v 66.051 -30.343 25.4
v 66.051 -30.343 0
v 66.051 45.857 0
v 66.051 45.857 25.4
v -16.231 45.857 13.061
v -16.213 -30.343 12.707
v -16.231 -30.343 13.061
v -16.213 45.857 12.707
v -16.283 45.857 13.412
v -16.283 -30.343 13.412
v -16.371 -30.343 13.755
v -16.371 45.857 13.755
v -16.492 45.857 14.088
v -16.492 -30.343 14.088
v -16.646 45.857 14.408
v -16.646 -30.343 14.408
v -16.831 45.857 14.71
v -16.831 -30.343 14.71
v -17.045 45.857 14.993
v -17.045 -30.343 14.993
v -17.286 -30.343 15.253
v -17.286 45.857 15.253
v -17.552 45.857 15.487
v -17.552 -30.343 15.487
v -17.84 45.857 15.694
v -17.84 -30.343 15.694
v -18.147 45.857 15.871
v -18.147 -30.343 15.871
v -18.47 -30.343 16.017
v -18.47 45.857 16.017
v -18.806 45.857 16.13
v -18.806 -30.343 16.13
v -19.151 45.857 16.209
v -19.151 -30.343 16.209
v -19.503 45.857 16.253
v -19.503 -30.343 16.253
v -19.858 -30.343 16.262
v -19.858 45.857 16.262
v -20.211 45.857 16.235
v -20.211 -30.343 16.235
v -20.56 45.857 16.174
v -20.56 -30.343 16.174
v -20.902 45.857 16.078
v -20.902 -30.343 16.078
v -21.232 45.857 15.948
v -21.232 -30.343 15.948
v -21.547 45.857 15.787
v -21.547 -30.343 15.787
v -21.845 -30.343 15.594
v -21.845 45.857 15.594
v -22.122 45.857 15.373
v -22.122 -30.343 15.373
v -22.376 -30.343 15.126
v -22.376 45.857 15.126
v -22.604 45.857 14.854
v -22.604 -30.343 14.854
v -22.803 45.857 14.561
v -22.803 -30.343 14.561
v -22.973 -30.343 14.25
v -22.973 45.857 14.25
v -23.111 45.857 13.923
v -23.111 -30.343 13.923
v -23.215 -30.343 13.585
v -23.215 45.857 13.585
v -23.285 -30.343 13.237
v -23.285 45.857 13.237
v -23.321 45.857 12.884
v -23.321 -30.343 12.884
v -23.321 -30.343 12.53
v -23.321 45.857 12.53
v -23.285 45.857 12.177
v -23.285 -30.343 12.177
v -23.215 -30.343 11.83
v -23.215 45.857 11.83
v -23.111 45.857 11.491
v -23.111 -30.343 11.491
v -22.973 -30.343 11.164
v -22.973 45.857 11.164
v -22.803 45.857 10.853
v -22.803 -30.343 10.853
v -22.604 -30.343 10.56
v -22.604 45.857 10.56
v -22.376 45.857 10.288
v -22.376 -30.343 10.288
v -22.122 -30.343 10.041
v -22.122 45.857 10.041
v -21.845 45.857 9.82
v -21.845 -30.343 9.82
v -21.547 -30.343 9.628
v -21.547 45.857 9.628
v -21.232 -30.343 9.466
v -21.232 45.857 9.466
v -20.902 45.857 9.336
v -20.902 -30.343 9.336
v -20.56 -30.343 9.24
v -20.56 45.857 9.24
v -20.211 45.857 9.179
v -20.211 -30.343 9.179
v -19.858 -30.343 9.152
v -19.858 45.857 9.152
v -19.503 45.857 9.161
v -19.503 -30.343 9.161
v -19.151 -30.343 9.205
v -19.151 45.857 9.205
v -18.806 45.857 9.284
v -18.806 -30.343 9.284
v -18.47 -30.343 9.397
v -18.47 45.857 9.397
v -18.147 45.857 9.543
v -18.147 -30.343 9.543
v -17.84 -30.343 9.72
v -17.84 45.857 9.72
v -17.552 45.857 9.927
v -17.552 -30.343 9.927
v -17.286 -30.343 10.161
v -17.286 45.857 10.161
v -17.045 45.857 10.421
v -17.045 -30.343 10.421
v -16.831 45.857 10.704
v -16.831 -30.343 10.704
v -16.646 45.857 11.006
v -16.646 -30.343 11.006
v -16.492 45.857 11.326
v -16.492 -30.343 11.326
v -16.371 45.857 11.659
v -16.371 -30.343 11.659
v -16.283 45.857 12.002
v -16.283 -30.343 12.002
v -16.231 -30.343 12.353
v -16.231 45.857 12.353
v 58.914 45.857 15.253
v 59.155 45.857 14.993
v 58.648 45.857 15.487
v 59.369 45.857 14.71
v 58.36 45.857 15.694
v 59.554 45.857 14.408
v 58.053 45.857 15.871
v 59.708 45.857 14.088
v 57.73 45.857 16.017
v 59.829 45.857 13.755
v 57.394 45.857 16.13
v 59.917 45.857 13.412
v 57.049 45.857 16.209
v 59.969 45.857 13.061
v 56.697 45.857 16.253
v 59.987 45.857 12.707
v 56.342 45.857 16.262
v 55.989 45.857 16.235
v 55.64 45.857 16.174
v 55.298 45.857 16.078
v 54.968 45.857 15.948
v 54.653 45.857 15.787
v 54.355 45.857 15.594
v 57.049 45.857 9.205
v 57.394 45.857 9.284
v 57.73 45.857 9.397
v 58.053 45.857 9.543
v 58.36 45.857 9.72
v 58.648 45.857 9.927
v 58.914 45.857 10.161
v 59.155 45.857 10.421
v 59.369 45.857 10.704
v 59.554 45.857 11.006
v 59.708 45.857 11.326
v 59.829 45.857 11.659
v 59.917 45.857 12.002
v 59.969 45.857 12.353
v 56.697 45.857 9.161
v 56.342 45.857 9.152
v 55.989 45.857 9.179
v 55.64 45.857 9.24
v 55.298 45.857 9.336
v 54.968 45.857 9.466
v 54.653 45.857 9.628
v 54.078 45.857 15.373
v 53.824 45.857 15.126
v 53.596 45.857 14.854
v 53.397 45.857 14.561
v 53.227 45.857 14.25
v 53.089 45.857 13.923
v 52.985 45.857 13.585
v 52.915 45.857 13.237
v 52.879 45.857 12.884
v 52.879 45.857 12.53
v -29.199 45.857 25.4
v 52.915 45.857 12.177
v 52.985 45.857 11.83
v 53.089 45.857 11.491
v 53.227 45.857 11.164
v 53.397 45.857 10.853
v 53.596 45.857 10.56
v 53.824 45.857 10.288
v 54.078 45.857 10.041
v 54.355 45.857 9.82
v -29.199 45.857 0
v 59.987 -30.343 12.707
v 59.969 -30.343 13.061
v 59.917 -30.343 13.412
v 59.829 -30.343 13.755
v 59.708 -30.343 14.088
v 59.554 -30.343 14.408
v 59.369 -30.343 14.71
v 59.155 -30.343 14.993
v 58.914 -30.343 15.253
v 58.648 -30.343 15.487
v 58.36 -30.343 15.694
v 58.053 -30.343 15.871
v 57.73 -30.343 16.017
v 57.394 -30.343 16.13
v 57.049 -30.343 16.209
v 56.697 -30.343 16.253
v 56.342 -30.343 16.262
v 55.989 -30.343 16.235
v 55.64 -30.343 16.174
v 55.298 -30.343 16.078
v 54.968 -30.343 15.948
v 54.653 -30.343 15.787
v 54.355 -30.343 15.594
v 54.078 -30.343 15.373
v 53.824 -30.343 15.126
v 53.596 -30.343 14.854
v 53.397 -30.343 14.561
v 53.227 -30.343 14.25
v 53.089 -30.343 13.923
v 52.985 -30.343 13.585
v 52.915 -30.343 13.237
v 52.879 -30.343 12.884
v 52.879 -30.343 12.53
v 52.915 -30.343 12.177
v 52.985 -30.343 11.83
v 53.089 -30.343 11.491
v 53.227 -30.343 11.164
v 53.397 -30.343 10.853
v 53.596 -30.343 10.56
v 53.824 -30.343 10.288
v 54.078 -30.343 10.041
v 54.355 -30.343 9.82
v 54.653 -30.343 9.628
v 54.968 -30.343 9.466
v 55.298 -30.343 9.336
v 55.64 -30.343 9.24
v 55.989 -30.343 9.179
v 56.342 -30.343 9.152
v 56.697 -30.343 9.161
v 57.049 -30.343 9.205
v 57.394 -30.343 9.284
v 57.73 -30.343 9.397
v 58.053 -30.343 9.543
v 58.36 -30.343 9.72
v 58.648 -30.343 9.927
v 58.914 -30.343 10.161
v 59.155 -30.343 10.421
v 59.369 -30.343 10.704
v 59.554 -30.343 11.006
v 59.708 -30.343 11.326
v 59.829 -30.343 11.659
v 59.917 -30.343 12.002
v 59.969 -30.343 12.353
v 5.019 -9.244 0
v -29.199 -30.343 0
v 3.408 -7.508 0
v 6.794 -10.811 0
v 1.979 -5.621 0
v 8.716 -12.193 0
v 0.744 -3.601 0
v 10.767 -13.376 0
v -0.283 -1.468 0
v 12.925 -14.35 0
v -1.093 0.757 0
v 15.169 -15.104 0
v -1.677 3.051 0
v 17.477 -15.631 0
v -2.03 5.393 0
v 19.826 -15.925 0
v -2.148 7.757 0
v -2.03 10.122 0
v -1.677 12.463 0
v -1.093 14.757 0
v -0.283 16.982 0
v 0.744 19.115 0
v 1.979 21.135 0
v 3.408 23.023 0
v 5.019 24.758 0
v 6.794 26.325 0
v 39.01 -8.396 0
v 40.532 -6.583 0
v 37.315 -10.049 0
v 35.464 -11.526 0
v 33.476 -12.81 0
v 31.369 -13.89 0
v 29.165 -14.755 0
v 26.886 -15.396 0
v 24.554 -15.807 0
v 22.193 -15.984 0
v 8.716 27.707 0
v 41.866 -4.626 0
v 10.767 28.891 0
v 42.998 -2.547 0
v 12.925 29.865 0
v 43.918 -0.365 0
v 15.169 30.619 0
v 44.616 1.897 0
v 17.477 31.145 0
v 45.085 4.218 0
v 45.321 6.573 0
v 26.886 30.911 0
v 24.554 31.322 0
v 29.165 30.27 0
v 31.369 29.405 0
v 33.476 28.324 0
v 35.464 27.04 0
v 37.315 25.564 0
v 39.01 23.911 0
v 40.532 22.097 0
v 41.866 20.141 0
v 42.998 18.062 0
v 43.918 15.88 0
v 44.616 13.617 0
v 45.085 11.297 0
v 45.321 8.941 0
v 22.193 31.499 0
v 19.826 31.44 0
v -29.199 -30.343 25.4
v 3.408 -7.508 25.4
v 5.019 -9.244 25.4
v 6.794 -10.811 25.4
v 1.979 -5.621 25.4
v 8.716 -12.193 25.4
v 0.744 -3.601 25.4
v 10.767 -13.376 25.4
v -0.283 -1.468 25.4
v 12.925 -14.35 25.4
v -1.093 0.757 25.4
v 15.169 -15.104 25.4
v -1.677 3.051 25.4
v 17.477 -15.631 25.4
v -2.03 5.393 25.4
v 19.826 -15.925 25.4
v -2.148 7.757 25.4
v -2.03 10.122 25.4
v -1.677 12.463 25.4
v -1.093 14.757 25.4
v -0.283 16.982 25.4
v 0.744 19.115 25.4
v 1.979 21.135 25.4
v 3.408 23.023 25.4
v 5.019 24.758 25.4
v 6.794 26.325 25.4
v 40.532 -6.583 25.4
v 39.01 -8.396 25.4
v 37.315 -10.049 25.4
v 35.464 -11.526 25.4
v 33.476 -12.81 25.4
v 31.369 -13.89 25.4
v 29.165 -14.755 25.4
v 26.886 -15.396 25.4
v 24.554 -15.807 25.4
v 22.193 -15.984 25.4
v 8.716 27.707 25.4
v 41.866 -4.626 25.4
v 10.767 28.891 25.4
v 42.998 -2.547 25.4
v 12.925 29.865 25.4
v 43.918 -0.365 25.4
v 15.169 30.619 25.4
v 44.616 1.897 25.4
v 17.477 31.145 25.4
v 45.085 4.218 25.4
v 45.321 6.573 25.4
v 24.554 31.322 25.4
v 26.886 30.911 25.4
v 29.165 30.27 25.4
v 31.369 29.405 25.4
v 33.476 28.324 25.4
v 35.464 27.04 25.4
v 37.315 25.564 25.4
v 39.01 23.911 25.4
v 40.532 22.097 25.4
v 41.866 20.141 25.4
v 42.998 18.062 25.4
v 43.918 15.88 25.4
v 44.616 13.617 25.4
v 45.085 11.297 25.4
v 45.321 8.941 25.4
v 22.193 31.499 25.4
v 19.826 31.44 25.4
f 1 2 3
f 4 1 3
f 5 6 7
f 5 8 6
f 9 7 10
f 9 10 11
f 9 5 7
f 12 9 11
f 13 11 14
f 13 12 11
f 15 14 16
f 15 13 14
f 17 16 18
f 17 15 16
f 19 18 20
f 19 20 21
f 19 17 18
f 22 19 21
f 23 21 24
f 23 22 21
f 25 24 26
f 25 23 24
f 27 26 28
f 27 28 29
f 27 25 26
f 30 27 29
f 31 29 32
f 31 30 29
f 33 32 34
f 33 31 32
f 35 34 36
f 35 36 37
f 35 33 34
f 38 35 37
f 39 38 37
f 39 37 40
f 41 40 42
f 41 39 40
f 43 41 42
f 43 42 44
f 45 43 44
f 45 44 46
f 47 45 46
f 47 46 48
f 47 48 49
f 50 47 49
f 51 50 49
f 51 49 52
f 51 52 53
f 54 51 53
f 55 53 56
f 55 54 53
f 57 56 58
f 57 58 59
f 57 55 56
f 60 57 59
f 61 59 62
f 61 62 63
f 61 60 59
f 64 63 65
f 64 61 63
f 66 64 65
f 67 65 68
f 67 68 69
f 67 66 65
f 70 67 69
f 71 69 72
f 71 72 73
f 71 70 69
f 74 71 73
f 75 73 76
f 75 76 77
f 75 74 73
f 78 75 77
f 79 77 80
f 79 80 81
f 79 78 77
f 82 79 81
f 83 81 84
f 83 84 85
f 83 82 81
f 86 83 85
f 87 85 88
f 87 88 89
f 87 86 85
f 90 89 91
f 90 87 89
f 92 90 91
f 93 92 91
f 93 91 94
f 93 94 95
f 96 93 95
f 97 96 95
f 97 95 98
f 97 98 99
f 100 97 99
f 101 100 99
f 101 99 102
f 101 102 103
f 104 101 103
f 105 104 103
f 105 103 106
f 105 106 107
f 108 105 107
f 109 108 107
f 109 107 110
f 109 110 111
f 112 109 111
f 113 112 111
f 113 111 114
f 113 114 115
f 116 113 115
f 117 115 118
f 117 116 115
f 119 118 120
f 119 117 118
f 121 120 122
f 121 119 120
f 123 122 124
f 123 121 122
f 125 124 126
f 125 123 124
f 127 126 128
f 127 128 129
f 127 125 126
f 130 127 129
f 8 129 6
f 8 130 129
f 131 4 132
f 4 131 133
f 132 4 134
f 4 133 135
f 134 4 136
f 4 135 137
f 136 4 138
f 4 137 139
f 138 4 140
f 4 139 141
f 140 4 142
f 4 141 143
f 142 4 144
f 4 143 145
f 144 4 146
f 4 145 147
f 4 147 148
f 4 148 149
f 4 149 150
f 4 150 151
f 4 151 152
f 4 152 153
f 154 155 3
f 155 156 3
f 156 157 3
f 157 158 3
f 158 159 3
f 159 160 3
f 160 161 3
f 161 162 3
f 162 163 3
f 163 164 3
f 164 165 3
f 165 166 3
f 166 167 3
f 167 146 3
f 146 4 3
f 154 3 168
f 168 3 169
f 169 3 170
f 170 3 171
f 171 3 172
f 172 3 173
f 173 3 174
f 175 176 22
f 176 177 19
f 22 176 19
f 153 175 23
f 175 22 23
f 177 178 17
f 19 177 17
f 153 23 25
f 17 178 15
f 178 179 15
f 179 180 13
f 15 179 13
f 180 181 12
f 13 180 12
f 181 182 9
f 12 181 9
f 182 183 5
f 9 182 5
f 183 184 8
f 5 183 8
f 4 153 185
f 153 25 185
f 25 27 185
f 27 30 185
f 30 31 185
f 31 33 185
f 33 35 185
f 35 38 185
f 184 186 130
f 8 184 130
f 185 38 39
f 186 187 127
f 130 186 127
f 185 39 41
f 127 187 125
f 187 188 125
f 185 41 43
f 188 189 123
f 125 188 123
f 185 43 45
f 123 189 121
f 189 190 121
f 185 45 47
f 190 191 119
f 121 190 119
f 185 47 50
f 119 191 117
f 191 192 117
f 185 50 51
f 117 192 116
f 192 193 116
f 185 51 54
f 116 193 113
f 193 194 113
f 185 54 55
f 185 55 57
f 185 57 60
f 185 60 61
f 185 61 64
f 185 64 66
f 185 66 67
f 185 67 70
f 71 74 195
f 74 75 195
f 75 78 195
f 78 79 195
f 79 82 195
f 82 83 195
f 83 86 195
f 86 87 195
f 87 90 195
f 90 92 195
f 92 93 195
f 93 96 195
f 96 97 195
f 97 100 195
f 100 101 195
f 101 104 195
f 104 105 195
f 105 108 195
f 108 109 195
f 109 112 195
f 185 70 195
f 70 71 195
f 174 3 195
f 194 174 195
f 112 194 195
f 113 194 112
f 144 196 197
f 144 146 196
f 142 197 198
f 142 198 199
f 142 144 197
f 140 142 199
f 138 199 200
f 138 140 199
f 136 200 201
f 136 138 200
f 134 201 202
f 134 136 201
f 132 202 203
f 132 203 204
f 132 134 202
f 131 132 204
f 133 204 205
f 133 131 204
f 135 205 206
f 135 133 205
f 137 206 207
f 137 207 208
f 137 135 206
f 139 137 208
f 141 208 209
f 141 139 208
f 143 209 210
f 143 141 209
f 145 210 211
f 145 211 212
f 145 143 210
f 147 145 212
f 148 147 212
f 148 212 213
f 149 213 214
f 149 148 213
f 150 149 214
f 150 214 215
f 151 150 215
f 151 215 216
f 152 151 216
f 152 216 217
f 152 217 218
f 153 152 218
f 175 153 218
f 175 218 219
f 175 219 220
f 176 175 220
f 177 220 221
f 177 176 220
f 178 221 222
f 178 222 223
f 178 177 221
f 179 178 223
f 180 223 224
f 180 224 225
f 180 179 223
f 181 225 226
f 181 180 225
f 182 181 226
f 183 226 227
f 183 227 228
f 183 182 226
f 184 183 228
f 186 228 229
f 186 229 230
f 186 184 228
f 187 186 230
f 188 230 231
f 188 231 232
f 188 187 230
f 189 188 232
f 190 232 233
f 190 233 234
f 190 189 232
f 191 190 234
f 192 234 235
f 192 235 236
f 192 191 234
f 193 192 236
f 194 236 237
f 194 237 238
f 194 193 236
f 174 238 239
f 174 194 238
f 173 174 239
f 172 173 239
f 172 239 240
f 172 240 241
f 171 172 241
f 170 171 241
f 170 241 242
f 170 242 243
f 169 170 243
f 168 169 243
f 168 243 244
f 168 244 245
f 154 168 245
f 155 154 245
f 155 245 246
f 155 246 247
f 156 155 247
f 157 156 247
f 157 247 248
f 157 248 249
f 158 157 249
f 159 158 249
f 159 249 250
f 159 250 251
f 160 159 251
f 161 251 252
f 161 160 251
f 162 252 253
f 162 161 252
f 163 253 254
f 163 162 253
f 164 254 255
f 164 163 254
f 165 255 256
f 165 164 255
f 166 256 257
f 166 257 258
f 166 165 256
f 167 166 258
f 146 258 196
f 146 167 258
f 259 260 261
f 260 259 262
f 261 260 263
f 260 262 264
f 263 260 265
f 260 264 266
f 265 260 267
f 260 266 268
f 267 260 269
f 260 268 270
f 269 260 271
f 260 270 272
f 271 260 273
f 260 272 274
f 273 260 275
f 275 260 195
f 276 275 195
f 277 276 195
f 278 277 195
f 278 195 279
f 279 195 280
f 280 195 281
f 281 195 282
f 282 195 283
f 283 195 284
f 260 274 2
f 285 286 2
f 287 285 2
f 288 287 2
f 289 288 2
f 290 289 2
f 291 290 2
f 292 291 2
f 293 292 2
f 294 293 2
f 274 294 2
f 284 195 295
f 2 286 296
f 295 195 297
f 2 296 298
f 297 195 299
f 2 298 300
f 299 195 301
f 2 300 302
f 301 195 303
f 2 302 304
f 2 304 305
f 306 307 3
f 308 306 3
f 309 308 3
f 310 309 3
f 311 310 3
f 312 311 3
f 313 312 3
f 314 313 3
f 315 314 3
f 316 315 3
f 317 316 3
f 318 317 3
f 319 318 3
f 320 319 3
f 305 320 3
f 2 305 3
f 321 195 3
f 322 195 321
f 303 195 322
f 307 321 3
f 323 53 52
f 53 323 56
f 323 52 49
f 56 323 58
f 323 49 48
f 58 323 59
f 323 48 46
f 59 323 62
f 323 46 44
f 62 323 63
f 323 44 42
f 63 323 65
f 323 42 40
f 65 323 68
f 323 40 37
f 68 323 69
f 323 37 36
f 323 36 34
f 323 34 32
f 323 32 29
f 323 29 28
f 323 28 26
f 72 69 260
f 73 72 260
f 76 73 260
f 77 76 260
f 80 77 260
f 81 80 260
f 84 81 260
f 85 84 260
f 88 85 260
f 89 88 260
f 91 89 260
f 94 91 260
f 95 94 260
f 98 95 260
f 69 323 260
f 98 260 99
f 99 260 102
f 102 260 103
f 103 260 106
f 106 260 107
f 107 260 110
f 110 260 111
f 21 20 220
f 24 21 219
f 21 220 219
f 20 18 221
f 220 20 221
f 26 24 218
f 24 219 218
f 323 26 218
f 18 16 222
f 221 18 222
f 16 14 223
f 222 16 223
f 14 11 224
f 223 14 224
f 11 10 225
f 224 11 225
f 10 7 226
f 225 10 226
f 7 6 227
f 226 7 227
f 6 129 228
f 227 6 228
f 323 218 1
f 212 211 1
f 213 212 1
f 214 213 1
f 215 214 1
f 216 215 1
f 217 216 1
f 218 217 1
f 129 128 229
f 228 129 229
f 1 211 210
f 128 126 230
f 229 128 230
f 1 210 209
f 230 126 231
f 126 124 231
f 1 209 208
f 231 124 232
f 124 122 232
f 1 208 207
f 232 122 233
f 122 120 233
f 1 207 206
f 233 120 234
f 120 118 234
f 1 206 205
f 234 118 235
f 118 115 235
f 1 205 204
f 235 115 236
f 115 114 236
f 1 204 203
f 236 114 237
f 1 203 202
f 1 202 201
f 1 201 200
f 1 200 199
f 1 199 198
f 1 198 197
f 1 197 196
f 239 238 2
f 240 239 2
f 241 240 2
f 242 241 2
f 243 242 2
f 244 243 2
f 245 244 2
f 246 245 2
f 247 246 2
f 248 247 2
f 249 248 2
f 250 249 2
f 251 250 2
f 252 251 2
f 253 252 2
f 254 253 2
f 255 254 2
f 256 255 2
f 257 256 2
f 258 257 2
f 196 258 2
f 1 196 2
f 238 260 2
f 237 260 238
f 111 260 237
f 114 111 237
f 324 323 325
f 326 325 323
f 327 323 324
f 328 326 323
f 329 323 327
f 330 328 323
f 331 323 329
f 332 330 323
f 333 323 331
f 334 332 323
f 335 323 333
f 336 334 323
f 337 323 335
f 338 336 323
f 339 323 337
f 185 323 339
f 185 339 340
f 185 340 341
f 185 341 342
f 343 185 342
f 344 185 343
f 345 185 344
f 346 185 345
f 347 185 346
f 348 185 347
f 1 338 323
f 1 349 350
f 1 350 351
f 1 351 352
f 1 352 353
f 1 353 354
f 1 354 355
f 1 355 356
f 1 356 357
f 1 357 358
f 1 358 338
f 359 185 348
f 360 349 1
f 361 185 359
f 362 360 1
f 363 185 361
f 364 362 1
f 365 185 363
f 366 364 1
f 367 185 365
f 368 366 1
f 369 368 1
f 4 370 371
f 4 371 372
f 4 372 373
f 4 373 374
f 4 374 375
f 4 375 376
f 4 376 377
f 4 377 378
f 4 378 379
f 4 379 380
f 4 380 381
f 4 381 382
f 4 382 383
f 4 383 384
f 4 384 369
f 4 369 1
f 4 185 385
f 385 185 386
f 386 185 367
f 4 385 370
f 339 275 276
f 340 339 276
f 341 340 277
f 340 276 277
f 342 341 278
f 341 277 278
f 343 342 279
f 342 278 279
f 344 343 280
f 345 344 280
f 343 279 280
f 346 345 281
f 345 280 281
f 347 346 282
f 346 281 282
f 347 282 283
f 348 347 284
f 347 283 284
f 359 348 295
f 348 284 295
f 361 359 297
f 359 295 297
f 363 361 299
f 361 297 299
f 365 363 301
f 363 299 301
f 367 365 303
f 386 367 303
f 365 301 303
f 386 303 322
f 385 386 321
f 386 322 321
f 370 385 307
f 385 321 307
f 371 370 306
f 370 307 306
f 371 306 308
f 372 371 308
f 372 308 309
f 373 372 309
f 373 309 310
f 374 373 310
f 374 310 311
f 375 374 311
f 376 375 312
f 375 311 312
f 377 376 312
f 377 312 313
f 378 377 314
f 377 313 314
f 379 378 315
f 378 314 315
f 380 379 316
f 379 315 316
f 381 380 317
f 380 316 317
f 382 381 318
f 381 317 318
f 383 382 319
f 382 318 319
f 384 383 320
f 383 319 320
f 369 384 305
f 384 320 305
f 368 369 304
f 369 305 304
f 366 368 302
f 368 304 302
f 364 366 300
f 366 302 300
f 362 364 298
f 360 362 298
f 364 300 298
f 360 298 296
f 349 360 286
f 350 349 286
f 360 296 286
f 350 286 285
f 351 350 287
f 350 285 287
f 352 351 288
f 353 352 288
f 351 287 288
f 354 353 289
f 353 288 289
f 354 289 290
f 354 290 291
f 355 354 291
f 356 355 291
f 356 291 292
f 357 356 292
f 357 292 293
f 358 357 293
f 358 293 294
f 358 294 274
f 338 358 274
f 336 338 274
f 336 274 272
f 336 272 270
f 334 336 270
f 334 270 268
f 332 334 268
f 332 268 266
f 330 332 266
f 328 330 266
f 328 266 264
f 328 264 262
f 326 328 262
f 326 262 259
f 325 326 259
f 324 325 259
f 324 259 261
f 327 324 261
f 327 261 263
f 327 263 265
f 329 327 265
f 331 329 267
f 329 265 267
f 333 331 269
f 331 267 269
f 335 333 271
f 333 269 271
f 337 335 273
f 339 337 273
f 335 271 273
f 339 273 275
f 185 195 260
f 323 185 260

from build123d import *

# Parameters (mm, degrees)
F1_DEPTH  = 25.4
F2_R      = 3.556
F3_DEPTH  = 30.342798
F3_FACE_R = 3.556
F4_DEPTH  = 45.857202


with BuildPart() as f1:
    # F0 (on Top) → F1 (new body)
    with BuildSketch(Plane.XY):
        with BuildLine():
            Line((-2.147933, 7.757202), (-29.198933, 7.757202))
            Line((-29.198933, 7.757202), (-29.198933, -30.342798))
            Line((-29.198933, -30.342798), (66.051067, -30.342798))
            Line((66.051067, -30.342798), (66.051067, 7.757202))
            Line((66.051067, 7.757202), (45.350067, 7.757202))
            ThreePointArc((45.350067, 7.757202), (21.601067, -15.991798), (-2.147933, 7.757202))
        make_face()
        with BuildLine():
            Line((66.051067, 45.857202), (-29.198933, 45.857202))
            Line((-29.198933, 45.857202), (-29.198933, 7.757202))
            Line((-29.198933, 7.757202), (-2.147933, 7.757202))
            ThreePointArc((-2.147933, 7.757202), (21.601067, 31.506202), (45.350067, 7.757202))
            Line((45.350067, 7.757202), (66.051067, 7.757202))
            Line((66.051067, 7.757202), (66.051067, 45.857202))
        make_face()
    extrude(amount=F1_DEPTH)

    # F2 (on Front) → F3 (cut, through all)
    with BuildSketch(Plane.XZ):
        with Locations((-19.768986, 12.707096)):
            Circle(F2_R)
        with Locations((56.431014, 12.707096)):
            Circle(F2_R)
    extrude(amount=F3_DEPTH, mode=Mode.SUBTRACT)

    # F3_face (on face) → F4 (cut, through all)
    with BuildSketch(Plane(origin=(-19.768986, 0, 12.707096), x_dir=(1, 0, 0), z_dir=(0, -1, 0))):
        Circle(F3_FACE_R)
        with Locations((76.2, 0)):
            Circle(F3_FACE_R)
    extrude(amount=-F4_DEPTH, mode=Mode.SUBTRACT)


solid = f1.part
